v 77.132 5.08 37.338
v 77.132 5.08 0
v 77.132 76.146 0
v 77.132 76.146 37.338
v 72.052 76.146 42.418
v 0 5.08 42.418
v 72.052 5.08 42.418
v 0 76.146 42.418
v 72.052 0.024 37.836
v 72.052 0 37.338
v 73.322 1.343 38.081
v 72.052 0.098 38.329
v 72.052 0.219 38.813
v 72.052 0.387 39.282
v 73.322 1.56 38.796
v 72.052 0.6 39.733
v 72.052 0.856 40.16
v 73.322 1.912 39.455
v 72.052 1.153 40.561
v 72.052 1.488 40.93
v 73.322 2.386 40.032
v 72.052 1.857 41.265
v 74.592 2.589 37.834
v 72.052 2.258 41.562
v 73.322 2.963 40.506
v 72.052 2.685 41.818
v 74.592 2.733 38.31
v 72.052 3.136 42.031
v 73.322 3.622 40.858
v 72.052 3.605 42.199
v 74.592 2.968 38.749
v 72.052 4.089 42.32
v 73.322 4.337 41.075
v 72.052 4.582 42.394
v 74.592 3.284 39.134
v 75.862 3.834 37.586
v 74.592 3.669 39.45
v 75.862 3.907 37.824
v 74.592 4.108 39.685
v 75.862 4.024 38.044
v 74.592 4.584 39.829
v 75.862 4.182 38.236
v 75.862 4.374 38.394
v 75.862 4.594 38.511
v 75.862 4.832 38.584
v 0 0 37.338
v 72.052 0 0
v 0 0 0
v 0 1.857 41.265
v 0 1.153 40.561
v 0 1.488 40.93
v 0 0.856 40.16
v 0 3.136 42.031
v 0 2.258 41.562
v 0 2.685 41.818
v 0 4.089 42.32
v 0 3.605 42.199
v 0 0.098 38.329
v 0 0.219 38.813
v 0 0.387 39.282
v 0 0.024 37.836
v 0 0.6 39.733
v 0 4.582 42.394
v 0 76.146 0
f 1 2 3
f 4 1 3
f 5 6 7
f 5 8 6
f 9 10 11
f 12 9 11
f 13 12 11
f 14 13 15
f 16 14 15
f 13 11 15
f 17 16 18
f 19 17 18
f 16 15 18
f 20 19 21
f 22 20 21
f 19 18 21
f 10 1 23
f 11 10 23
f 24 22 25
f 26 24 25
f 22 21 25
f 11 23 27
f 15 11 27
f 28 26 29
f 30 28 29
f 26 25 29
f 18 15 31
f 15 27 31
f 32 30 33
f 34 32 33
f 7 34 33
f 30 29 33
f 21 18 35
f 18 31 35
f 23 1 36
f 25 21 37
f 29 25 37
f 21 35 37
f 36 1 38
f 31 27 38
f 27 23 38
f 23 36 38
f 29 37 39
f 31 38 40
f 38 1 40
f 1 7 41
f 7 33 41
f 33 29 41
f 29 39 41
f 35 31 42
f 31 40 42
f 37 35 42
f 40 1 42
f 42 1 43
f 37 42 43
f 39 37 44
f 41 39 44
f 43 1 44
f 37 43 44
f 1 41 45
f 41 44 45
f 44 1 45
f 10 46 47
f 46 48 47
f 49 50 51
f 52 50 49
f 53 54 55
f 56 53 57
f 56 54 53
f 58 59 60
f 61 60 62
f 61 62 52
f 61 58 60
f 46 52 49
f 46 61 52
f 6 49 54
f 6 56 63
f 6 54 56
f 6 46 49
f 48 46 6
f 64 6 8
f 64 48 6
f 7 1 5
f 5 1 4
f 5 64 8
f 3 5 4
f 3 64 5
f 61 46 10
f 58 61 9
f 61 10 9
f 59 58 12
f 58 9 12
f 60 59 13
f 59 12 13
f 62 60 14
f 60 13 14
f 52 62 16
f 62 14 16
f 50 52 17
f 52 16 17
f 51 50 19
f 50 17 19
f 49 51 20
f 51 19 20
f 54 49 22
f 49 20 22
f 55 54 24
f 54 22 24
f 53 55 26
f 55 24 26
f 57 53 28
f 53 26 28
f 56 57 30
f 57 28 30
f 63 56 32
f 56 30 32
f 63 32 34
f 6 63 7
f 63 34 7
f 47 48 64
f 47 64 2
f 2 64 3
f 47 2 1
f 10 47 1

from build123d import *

# Parameters (mm, degrees)
F0_W     = 77.131554
F0_H     = 76.146387
F1_DEPTH = 42.418
F2_R     = 5.08
F3_SIZE  = 5.08


with BuildPart() as f1:
    # F0 (on Top) → F1 (new body)
    with BuildSketch(Plane.XY):
        with Locations((38.565777, 38.073193)):
            Rectangle(F0_W, F0_H)
    extrude(amount=F1_DEPTH)

    # F2
    f2_edges = [f1.edges().sort_by_distance(p)[0] for p in [
        (38.565777, 0, 42.418),
    ]]
    fillet(f2_edges, radius=F2_R)

    # F3
    f3_edges = [f1.edges().sort_by_distance(p)[0] for p in [
        (77.131554, 40.613193, 42.418),
    ]]
    chamfer(f3_edges, length=F3_SIZE)


solid = f1.part
